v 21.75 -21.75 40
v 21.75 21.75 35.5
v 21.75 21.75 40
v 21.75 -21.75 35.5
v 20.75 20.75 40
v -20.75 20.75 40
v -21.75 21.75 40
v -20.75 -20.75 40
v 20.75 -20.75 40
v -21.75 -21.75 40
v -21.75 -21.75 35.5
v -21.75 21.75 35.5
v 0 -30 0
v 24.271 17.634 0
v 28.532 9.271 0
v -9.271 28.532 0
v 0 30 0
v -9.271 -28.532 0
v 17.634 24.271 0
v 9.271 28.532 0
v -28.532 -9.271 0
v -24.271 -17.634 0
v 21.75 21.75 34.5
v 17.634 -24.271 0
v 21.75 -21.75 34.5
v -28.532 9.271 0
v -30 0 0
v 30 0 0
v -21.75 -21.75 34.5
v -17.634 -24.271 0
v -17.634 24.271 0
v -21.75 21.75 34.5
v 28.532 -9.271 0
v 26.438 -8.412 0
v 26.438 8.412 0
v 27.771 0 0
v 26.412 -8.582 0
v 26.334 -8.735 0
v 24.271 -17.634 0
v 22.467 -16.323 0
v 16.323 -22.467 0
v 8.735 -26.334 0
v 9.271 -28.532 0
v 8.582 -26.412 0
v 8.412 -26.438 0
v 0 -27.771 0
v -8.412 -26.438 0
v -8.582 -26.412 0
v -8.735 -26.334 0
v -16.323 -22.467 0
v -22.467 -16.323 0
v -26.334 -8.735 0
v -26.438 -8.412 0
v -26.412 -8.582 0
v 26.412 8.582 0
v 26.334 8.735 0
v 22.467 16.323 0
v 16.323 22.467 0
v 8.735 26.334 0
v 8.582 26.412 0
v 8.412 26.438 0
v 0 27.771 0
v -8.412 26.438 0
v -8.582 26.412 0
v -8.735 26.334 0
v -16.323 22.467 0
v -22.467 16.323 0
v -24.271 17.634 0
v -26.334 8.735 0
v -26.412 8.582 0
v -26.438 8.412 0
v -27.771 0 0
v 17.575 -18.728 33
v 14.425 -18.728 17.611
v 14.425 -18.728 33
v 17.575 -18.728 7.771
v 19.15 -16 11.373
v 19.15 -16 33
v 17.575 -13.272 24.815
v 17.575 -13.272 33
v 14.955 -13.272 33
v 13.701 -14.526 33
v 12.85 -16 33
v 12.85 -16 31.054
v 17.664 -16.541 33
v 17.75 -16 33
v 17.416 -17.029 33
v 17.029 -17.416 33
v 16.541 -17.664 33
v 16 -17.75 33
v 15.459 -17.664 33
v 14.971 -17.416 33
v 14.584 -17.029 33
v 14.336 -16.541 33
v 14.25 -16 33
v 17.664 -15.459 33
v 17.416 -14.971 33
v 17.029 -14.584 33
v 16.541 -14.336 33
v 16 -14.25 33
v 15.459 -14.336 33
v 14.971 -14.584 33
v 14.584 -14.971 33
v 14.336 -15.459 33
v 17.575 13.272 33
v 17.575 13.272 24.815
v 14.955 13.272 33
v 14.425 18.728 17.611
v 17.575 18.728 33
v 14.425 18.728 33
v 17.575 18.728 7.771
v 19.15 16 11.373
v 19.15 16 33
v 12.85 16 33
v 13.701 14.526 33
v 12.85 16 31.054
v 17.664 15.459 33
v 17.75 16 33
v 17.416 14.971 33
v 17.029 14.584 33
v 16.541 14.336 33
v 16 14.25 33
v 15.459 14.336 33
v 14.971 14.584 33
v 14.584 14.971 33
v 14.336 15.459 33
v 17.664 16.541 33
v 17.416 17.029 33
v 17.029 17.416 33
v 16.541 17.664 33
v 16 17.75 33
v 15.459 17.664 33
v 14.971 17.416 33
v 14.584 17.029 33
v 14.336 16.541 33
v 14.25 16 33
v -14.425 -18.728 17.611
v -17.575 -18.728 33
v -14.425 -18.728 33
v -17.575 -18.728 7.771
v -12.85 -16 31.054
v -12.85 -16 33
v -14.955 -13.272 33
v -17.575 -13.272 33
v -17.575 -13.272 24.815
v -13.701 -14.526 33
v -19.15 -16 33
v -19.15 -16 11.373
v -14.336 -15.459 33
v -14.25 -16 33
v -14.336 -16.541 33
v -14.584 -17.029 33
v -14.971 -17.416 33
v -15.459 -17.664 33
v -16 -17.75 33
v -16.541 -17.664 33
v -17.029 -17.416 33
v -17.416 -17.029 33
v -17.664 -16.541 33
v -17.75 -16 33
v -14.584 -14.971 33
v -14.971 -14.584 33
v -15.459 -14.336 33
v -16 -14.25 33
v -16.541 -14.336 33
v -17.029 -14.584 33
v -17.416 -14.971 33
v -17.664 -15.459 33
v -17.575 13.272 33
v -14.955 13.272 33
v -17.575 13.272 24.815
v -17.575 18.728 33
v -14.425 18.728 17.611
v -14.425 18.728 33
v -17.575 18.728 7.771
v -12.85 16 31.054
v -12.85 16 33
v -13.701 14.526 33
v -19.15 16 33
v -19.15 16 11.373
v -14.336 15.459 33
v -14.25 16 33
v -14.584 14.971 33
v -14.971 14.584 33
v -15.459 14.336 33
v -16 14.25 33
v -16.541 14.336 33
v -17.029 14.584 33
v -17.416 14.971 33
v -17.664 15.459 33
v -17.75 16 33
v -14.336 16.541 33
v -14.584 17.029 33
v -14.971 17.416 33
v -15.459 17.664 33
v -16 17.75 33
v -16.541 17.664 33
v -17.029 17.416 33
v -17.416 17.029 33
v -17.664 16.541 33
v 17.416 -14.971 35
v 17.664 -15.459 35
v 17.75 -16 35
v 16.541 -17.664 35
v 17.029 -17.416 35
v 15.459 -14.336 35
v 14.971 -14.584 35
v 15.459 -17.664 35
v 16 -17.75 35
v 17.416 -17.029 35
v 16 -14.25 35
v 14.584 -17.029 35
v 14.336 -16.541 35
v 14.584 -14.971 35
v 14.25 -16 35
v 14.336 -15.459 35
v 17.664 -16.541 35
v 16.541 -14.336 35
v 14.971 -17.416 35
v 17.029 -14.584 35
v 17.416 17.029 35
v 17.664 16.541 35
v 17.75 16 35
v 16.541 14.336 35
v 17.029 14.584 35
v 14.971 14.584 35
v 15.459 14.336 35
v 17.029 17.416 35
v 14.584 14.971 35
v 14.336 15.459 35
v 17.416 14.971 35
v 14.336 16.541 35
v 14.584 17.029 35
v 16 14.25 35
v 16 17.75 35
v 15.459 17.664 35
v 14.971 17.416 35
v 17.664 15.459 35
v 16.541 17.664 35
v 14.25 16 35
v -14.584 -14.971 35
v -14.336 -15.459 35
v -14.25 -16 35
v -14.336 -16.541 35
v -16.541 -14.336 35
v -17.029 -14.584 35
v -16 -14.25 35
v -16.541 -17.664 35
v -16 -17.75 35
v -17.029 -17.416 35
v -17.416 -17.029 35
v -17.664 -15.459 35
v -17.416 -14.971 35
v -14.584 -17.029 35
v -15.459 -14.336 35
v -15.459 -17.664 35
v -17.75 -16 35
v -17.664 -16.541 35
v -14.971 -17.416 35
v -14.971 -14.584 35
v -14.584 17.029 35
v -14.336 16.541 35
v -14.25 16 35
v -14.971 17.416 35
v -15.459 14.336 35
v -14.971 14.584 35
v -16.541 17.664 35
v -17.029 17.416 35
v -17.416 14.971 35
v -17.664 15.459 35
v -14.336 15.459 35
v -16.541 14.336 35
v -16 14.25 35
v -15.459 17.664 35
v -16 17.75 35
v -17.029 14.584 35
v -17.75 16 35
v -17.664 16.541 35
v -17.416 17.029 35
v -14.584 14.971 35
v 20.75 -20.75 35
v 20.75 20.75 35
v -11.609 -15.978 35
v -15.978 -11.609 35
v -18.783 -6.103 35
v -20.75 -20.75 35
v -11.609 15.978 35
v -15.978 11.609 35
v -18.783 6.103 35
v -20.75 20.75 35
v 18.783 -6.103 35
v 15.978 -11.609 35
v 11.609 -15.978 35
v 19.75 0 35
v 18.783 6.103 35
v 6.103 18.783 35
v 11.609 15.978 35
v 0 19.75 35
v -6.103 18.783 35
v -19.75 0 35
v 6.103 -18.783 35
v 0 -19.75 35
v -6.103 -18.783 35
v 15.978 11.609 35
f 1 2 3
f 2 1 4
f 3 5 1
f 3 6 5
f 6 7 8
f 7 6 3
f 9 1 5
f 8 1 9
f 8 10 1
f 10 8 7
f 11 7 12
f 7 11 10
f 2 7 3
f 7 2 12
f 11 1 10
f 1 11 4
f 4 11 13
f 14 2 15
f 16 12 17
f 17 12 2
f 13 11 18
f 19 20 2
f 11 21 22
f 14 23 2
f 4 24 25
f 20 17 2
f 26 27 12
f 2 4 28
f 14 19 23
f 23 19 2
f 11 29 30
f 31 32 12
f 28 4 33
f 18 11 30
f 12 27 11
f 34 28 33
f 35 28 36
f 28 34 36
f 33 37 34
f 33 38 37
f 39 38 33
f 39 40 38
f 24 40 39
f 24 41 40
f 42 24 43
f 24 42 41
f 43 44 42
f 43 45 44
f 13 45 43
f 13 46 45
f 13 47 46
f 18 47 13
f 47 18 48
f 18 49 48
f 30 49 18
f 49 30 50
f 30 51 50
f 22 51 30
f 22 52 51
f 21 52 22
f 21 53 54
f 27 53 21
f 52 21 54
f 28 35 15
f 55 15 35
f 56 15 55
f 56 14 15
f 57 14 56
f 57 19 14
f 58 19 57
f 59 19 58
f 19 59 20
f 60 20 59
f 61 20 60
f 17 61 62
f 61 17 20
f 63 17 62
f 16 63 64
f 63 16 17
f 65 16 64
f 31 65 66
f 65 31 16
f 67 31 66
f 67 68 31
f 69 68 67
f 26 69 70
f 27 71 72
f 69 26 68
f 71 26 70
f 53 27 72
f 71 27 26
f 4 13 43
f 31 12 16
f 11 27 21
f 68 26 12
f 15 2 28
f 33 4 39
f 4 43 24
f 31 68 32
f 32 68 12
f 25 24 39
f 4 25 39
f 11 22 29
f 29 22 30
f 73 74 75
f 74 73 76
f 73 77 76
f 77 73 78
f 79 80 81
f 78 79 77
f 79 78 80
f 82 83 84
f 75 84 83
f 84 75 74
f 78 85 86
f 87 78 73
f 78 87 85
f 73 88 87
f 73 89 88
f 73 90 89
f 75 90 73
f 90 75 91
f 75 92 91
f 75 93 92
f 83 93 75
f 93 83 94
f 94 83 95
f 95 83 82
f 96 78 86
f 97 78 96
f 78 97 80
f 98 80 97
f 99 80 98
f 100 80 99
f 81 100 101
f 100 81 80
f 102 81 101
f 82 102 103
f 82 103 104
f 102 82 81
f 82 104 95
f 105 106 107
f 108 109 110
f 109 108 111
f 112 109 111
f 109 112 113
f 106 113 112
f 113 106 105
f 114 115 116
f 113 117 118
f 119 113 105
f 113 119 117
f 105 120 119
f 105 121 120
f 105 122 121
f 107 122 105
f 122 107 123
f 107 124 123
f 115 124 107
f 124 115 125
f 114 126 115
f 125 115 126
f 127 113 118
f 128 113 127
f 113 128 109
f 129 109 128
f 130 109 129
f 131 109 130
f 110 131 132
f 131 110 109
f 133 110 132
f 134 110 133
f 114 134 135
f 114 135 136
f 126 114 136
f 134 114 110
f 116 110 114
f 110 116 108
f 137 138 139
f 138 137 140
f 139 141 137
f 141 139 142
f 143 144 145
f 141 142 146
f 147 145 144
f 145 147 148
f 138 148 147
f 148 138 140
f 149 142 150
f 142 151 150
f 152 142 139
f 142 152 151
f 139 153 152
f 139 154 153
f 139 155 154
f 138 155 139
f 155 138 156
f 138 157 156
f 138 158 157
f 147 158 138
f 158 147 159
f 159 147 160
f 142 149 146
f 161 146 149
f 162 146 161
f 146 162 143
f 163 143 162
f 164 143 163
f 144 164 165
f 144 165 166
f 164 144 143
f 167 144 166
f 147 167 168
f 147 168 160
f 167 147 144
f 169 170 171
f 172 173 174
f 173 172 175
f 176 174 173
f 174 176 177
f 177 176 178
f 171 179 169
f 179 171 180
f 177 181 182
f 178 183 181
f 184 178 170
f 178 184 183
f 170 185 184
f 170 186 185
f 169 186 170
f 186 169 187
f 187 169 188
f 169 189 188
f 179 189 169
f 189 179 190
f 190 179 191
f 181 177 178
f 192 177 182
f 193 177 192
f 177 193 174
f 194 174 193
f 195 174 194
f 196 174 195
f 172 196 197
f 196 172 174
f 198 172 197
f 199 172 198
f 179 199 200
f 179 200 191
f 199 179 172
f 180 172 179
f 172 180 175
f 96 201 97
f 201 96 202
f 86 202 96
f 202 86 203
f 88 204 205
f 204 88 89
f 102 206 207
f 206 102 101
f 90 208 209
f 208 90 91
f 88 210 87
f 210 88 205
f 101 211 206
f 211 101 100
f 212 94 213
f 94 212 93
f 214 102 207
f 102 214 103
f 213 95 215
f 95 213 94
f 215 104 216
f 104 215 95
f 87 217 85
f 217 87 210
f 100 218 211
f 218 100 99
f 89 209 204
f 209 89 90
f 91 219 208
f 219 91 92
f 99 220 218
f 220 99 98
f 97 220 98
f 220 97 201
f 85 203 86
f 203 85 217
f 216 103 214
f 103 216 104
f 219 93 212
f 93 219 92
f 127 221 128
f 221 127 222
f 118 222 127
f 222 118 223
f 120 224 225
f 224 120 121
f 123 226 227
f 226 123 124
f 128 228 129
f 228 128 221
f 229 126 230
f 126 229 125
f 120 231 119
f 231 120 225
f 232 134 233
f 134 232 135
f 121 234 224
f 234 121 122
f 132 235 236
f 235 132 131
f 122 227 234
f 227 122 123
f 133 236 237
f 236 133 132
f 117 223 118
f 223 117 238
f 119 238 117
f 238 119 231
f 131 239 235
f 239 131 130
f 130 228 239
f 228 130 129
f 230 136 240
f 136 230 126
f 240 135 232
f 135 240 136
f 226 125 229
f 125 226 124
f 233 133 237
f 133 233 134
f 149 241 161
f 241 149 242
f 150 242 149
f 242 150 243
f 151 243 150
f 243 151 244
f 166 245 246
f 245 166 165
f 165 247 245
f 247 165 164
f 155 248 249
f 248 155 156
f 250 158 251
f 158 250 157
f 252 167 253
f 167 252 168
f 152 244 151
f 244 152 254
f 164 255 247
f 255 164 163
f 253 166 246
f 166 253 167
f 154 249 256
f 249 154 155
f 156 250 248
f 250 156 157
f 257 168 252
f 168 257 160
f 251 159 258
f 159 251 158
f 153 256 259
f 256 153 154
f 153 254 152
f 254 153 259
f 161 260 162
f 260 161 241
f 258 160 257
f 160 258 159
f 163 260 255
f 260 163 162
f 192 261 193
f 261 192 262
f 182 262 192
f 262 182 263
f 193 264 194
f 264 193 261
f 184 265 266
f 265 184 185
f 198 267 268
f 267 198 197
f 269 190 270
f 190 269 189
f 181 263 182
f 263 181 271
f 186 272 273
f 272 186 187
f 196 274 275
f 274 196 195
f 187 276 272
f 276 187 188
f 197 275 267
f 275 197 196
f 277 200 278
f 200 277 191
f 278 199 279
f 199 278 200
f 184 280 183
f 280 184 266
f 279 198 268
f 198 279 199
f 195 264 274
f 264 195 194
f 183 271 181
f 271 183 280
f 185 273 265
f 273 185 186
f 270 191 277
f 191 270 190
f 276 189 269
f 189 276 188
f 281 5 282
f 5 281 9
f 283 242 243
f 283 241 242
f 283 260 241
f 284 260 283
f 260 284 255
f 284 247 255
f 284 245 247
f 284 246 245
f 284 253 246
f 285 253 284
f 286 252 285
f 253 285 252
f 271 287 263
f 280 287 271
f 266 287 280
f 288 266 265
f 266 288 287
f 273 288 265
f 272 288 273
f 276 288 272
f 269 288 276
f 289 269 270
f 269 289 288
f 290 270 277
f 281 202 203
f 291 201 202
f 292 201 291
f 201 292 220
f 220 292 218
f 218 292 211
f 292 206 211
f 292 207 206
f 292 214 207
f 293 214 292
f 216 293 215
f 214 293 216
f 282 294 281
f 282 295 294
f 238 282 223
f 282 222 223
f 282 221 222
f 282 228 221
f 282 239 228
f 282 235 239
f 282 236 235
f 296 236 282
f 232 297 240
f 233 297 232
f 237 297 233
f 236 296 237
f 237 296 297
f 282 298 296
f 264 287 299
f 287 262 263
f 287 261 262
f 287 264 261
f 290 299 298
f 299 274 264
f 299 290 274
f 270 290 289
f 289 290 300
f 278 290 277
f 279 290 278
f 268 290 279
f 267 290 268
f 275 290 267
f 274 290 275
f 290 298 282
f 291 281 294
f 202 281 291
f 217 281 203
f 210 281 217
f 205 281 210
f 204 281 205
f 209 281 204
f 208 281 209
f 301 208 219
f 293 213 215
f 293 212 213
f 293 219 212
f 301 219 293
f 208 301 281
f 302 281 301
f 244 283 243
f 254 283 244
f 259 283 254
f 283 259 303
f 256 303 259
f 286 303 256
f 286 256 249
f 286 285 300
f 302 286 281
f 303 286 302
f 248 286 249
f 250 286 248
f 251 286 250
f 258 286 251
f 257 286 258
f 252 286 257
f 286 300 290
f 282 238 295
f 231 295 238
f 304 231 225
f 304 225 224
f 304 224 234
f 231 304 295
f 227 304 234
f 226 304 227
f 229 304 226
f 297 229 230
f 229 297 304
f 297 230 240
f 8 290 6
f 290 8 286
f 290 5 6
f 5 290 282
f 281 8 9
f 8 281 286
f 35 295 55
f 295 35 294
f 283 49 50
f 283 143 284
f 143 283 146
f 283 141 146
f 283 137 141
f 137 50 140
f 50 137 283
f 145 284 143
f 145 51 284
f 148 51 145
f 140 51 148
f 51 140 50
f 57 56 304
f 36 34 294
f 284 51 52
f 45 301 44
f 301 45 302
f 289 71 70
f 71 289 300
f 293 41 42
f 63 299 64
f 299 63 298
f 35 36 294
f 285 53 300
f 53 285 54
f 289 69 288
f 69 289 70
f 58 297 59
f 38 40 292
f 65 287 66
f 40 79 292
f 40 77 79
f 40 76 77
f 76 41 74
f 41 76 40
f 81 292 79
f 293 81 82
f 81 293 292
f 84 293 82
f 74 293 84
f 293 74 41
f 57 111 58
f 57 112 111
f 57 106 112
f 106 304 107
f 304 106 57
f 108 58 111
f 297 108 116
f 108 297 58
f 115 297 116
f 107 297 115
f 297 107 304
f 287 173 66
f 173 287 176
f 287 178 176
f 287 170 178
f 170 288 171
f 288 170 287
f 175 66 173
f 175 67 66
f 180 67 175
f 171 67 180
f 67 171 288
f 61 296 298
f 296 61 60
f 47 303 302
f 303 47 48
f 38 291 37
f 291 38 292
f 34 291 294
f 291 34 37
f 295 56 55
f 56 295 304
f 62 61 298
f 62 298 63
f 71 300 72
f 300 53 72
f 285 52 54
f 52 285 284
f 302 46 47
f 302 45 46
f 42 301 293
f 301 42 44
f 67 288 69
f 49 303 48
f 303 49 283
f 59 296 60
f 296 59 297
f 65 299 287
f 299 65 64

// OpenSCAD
// preview[view:north east, tilt:top]

// how tall to make the piece. mm.
tubeheight= 40; // [10:200]
// diameter of the largest pipe mounth
largestpipe = 56; // [10:100]
// fan size in mm
fansize = 41.5; // [10:200]
// distance from mounting holes centers. mm
mountingholes = 32; //[8:195]
// distance from each of the hexagon sides. mm (0 to disable and screw in directly on the plastic)
nutsize = 6.3;
// diameter of the screw. mm
screwdiam = 3.5;
// thinest wall printable. 2mm is sturdy enough
wallthickness=2;

// value used on $fn (i.e. how many faces to use on cylinders sides)
facerez = 20;

// advanced: how much to overshoot difference()s so that the preview doesn't show
// mangled faces if the subtracted faces matches while previewing in openSCAD.
clearpreview = 1;


module fan(size,tall){
	difference(){
		// + body
		cube([size,size,tall], true);
		// + holes
		// - blades
		translate([0,0,-tall])
			cylinder(h=tall*2, r=size*0.45);
		// - screws
		// TODO: screw holes
	}
}
module pipe(diam){
	difference(){
		circle(r=diam/2);
		circle(r=diam/2-wallthickness);
	}
}



module conector(fansize,pipe,tall){
	difference()
	{
		union()
		{
			translate([-(fansize+wallthickness)/2,-(fansize+wallthickness)/2,tall-5])
				cube([fansize+wallthickness,fansize+wallthickness,5]);
			hull()
			{
				color("green") translate([0,0,tall-5] ) cube([fansize+wallthickness,fansize+wallthickness,1],true);
				color("red")   translate([0,0,0] ) cylinder(1,(pipe/2)+wallthickness, $fn=facerez);
			}
		}
		union()
		{
			translate([-fansize/2,-fansize/2,tall-5])
				cube([fansize,fansize,5+clearpreview]);
			color("blue") hull()
			{
				color("darkgreen") translate([0,0,tall-5] ) cylinder(1,(fansize-2)/2,$fn=facerez);
				color("darkred") translate([0,0,-1] ) cylinder(1,pipe/2,$fn=facerez);
			}
			// nut holder
			translate([0,0,wallthickness]){
			translate([mountingholes/2,  -mountingholes/2,0]) cylinder(d=nutsize,h=tall-5-(2*wallthickness), $fn=6); // hexagon nut holder
			translate([mountingholes/2,  mountingholes/2, 0]) cylinder(d=nutsize,h=tall-5-(2*wallthickness), $fn=6);
			translate([-mountingholes/2, -mountingholes/2,0]) cylinder(d=nutsize,h=tall-5-(2*wallthickness), $fn=6);
			translate([-mountingholes/2, mountingholes/2, 0]) cylinder(d=nutsize,h=tall-5-(2*wallthickness), $fn=6);
			// screw hole
			translate([mountingholes/2,  -mountingholes/2,0]) cylinder(d=screwdiam,h=tall, $fn=facerez);
			translate([mountingholes/2,  mountingholes/2, 0]) cylinder(d=screwdiam,h=tall, $fn=facerez);
			translate([-mountingholes/2, -mountingholes/2,0]) cylinder(d=screwdiam,h=tall, $fn=facerez);
			translate([-mountingholes/2, mountingholes/2, 0]) cylinder(d=screwdiam,h=tall, $fn=facerez);
			}
		}
	}
}
module batteryholder(){ // AA = 50lenght, 14 radius
	union(){
		rotate([0,90]) cylinder(h=50, r=14, center=true);
		translate([0,7,0]) cube([50,14,28], center=true);
	}

}


//pipe(largestpipe);
//color("red") translate([0,0,40]) fan(fansize,1);



conector(fansize,largestpipe,tubeheight);

/* translate([-largestpipe-5, 0,0])
difference()
{
	conector(fansize,largestpipe, 50 );
	translate([-50,0,-10]) cube([100,100,100]);
}

/*
   mirror([0,0,0]){
   translate([0,-fansize+7,50-14])
   color("purple") batteryholder();
   }
   mirror([0,1,0]){
   translate([0,-fansize+7,50-14])
   color("purple") batteryholder();
   }
/* */
